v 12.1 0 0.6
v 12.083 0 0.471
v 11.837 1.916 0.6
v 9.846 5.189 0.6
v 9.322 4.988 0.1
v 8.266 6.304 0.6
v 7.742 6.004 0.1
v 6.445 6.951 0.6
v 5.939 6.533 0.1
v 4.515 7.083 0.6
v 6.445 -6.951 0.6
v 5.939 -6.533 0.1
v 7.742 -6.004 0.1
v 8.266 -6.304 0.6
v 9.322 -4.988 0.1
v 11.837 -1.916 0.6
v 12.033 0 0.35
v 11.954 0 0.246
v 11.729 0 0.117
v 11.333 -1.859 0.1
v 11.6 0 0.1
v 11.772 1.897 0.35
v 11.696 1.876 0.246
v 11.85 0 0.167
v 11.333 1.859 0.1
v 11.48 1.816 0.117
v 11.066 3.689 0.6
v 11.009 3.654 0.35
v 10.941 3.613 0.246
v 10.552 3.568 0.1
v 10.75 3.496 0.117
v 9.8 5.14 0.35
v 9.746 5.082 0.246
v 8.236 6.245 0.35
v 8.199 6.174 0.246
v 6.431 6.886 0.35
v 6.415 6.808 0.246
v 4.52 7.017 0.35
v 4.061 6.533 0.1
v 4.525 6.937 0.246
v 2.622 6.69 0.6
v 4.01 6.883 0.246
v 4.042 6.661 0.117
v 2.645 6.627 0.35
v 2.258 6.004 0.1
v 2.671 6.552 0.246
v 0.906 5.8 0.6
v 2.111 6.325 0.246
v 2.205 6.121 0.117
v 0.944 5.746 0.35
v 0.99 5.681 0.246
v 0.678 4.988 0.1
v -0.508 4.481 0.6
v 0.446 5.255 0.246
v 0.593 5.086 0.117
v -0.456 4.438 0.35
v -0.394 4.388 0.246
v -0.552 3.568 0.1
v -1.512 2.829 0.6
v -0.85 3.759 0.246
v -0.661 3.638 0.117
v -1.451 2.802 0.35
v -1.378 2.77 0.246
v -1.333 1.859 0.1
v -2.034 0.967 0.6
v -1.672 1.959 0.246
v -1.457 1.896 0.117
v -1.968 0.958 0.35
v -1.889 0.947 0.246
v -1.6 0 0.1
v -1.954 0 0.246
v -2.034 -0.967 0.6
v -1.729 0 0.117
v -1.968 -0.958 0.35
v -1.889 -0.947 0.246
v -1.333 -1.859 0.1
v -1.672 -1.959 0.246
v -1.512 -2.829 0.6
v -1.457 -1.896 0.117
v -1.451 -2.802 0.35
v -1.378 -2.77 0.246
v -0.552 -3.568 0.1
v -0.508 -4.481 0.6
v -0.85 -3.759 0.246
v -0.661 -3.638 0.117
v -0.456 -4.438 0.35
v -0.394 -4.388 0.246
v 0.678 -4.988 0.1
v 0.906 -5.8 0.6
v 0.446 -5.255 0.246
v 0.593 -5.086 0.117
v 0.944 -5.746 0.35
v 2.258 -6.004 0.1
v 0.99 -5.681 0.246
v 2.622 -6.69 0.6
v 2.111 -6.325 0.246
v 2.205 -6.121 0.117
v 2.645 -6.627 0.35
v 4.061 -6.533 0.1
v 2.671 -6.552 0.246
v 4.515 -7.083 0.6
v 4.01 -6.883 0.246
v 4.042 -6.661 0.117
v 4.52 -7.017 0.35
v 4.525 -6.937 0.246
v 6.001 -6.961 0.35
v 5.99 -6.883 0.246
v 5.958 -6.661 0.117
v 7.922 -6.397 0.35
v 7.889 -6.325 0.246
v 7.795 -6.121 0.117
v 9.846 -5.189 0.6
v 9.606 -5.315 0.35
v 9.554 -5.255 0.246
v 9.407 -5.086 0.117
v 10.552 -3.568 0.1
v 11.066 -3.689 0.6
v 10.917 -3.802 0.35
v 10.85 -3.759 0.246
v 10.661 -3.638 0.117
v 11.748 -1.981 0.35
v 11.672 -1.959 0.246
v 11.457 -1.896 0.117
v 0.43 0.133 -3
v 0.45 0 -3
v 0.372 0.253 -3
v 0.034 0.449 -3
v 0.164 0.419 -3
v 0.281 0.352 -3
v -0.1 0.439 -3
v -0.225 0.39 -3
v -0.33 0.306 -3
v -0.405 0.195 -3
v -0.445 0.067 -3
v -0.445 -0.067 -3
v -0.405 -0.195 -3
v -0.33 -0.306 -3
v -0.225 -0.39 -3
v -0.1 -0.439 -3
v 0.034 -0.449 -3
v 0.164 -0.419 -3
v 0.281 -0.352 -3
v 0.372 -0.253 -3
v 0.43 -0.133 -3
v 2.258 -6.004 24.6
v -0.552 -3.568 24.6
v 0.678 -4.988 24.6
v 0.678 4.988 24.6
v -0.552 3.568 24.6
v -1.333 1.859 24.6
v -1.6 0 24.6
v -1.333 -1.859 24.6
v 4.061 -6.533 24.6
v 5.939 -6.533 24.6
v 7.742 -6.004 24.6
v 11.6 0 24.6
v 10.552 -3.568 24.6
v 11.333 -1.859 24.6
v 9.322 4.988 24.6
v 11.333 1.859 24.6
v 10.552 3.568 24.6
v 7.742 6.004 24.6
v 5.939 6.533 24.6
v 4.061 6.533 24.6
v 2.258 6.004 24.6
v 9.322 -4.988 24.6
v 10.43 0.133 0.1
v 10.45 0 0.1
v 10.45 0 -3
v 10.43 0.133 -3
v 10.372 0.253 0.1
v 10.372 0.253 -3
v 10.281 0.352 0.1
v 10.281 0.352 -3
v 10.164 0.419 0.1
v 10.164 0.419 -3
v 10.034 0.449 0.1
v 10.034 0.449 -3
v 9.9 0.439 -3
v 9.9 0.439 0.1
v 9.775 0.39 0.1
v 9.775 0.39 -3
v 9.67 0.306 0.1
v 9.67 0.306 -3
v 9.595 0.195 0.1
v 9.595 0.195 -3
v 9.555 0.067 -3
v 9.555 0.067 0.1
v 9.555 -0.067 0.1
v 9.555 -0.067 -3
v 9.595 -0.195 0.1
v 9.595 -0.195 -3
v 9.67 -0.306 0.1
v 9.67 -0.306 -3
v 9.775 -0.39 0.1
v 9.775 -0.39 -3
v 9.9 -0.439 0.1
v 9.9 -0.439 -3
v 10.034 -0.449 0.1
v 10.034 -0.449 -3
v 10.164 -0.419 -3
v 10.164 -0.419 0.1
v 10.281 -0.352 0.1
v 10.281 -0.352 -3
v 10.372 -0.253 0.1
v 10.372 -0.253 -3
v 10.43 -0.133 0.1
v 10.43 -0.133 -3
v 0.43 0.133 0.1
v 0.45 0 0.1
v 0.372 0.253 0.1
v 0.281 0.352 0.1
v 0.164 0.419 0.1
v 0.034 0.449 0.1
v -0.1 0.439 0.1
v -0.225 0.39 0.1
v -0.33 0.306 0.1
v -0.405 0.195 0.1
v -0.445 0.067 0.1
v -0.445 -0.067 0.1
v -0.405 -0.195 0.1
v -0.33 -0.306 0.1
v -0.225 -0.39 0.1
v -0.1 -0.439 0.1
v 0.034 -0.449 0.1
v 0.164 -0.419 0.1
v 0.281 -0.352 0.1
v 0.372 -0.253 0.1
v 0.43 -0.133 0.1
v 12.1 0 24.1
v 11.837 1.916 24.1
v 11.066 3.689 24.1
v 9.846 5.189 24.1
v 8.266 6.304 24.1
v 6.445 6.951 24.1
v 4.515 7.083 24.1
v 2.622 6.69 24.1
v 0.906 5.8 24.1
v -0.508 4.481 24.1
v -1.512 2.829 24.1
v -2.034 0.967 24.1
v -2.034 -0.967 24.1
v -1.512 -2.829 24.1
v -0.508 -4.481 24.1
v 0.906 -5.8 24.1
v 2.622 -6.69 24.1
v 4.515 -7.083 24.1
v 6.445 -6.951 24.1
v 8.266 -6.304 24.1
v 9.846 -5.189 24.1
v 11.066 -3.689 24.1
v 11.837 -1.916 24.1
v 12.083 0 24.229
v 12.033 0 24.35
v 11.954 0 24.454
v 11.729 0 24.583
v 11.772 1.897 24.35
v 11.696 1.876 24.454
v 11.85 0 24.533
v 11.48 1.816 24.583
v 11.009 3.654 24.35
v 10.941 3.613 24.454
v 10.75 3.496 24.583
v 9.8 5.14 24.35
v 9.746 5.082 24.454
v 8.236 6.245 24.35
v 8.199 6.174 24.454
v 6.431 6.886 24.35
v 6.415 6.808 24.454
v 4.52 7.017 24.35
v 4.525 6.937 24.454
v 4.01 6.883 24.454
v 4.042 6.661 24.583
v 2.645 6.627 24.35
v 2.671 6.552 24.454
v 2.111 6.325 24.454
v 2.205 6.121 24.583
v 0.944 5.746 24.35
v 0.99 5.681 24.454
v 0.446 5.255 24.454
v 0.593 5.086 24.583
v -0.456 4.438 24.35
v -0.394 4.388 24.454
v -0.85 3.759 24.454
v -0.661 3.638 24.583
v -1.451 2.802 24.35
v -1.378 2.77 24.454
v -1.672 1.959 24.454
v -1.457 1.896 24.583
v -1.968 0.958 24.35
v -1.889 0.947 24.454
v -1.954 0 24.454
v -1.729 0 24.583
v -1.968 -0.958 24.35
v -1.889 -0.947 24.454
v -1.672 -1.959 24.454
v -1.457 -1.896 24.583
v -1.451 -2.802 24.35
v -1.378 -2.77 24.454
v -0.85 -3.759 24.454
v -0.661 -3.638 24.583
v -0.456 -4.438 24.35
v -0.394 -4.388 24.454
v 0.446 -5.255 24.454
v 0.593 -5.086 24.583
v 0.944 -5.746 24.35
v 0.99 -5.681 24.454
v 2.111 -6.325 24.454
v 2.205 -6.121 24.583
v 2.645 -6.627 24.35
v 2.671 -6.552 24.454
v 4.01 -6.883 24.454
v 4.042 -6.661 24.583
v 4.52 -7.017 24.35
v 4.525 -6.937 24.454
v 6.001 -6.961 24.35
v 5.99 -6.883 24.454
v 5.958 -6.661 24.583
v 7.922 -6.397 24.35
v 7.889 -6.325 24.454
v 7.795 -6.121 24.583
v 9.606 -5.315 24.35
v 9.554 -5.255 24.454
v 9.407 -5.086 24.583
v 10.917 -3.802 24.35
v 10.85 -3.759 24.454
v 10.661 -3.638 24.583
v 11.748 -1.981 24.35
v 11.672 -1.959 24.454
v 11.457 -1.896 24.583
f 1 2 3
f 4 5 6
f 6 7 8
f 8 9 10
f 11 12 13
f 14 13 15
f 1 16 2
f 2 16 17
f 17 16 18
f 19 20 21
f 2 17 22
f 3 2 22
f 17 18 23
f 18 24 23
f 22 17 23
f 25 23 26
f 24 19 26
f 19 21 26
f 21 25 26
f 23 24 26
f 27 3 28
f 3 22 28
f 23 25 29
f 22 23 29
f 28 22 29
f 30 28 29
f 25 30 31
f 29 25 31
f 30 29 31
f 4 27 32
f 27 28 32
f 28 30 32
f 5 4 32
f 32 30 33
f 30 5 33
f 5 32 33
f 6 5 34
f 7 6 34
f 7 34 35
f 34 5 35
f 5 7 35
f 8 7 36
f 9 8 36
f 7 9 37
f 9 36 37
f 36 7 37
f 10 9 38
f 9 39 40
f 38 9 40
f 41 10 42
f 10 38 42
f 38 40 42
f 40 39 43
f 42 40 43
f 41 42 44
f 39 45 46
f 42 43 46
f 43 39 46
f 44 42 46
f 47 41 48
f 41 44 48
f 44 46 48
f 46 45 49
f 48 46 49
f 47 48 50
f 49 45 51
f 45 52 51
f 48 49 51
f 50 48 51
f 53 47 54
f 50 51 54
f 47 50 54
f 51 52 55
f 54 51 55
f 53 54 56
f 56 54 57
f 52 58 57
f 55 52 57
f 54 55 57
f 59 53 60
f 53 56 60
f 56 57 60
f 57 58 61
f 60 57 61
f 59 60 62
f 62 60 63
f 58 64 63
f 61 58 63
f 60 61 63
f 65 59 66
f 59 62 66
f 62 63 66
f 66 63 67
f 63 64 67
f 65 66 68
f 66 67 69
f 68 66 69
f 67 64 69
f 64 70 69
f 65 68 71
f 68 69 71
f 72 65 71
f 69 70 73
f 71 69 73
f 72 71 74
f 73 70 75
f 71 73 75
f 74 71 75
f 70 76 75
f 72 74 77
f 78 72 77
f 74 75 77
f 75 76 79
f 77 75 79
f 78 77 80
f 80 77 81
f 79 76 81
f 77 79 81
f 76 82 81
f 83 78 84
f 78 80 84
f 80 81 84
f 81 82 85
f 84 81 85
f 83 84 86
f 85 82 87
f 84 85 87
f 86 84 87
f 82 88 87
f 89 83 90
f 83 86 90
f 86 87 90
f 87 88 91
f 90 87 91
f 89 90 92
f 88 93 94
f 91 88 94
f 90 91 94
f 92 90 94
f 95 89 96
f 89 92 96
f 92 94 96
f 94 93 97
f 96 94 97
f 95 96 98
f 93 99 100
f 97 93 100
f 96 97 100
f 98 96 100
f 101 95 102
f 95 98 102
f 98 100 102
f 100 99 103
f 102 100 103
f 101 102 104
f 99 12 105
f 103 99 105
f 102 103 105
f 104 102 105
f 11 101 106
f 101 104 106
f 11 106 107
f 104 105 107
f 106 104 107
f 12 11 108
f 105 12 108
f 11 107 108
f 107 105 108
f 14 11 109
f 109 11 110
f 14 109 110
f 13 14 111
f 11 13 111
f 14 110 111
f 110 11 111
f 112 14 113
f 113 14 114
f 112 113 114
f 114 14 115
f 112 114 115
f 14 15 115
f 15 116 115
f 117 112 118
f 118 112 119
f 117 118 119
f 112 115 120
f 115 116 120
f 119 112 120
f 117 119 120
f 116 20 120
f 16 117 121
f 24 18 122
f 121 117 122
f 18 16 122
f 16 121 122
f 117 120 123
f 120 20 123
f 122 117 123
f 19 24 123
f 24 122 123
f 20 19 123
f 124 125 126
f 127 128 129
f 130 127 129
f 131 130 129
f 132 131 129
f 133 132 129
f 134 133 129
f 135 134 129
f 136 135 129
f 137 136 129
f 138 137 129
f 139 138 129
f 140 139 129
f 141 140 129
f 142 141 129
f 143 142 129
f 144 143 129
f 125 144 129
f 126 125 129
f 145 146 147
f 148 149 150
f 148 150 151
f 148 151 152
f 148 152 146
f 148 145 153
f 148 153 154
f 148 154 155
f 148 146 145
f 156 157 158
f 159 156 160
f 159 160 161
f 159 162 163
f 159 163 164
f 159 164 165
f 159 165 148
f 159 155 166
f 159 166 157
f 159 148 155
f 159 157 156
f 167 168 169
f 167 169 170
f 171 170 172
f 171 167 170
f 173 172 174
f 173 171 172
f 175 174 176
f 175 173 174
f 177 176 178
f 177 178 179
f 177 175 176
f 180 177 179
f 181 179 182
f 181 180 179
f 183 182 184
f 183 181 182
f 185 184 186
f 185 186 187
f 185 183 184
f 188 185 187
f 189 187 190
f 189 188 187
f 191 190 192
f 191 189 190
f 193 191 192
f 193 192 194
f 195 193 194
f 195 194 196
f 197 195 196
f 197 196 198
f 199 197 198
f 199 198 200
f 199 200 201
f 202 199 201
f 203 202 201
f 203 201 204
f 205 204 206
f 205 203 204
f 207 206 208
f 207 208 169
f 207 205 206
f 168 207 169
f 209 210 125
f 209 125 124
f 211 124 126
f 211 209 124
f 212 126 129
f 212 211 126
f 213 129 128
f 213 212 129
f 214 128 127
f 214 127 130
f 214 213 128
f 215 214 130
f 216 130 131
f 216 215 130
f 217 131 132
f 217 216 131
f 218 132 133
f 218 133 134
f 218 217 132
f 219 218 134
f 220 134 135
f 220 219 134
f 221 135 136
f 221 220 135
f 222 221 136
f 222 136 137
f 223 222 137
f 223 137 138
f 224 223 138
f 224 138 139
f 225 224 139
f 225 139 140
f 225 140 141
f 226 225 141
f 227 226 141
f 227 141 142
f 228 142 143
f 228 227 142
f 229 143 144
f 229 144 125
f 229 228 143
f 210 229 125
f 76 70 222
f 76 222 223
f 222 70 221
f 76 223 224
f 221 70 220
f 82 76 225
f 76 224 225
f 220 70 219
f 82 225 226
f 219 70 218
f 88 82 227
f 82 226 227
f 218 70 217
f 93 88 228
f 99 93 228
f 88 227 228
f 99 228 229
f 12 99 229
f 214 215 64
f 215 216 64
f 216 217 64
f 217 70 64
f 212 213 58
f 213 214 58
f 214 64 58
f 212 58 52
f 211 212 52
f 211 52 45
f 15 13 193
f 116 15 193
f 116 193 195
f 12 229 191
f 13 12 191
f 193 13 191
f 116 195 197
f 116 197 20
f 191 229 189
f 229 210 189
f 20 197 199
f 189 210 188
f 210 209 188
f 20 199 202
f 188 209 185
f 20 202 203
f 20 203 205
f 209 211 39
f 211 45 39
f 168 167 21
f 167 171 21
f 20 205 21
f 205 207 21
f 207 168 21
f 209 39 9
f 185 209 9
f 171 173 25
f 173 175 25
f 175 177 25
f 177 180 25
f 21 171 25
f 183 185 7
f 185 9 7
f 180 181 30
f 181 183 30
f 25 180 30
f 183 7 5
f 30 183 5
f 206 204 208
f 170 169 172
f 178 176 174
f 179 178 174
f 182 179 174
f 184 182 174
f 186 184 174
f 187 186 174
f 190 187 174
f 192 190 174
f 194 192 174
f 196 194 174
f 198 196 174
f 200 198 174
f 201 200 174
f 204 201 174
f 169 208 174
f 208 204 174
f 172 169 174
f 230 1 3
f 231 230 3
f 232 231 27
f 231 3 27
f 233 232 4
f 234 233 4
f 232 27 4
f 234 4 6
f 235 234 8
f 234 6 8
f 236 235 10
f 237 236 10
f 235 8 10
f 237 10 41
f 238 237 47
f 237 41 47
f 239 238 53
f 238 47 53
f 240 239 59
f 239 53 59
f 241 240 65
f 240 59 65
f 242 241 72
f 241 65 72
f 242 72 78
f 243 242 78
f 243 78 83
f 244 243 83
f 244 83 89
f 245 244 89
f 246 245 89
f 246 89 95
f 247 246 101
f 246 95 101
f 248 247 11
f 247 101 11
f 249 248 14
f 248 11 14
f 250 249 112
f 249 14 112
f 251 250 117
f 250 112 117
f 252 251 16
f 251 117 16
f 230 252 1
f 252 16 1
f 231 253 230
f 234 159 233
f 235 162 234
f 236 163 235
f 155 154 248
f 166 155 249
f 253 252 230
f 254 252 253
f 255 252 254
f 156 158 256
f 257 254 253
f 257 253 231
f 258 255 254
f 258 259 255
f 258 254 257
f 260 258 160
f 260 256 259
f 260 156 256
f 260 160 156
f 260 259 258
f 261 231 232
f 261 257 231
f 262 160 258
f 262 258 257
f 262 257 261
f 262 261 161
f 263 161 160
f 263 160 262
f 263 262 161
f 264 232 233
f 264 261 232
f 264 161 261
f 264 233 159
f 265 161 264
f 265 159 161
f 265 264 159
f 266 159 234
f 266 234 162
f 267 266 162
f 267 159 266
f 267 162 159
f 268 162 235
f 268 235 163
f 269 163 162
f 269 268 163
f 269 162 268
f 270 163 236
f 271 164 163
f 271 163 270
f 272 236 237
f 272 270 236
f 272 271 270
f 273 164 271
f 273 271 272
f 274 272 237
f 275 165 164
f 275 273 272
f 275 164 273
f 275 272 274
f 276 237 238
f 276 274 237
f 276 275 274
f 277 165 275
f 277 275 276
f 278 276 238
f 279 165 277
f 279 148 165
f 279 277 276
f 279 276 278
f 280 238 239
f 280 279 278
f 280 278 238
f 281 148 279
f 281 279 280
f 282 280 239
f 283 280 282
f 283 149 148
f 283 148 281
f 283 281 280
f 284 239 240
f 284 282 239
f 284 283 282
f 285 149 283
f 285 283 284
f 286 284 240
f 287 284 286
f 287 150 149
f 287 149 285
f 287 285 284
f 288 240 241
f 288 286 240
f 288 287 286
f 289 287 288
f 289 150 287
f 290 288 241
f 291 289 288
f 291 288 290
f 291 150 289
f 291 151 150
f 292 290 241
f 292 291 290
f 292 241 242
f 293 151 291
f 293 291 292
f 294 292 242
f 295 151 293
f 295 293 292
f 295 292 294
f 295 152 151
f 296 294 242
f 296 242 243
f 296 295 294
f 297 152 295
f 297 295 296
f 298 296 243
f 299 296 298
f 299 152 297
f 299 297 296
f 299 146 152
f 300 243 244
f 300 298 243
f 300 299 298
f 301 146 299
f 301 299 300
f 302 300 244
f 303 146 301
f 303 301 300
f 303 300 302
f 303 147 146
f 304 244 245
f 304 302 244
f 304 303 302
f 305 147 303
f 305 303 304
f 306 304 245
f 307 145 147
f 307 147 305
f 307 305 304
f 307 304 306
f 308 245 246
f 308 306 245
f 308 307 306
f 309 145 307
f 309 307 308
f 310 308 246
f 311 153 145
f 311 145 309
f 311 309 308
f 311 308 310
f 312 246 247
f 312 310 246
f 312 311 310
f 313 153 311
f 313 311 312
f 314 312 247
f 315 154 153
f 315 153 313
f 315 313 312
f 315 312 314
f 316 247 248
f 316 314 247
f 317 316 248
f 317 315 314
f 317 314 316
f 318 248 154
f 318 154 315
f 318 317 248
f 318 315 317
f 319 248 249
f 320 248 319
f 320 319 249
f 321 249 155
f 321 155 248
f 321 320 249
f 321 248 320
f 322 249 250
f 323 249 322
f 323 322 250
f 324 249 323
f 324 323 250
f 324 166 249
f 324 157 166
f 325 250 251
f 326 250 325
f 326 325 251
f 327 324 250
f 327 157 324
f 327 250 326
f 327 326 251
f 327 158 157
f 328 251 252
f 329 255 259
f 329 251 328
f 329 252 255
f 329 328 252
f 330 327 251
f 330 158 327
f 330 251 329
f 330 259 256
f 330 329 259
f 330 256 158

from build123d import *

# Parameters (mm, degrees)
SKETCH001_R       = 0.45
PAD001_DEPTH      = 12.25
PAD001_DEPTH_BACK = 3.5
SKETCH_R          = 7.1
PAD_DEPTH         = 24.5
FILLET_R          = 0.5


with BuildPart() as pad001:
    # Sketch001 → Pad001 (new body, two sides)
    with BuildSketch(Plane.XY.offset(0.5)) as pad001_sk:
        Circle(SKETCH001_R)
        with Locations((10, 0)):
            Circle(SKETCH001_R)
    extrude(amount=PAD001_DEPTH)
    extrude(pad001_sk.sketch, amount=-PAD001_DEPTH_BACK)


with BuildPart() as l_radial_d14_2mm_p10_00mm_neosid_sd14:
    # Sketch → Pad (new body)
    with BuildSketch(Plane.XY.offset(0.1)):
        with Locations((5, 0)):
            Circle(SKETCH_R)
    extrude(amount=PAD_DEPTH)

    # Fillet
    fillet_edges = [l_radial_d14_2mm_p10_00mm_neosid_sd14.edges().sort_by_distance(p)[0] for p in [
        (-2.1, 0, 0.1),
        (-2.1, 0, 24.6),
    ]]
    fillet(fillet_edges, radius=FILLET_R)

    # Fillet_mp_cp: union Pad001
    add(pad001.part)


solid = l_radial_d14_2mm_p10_00mm_neosid_sd14.part
